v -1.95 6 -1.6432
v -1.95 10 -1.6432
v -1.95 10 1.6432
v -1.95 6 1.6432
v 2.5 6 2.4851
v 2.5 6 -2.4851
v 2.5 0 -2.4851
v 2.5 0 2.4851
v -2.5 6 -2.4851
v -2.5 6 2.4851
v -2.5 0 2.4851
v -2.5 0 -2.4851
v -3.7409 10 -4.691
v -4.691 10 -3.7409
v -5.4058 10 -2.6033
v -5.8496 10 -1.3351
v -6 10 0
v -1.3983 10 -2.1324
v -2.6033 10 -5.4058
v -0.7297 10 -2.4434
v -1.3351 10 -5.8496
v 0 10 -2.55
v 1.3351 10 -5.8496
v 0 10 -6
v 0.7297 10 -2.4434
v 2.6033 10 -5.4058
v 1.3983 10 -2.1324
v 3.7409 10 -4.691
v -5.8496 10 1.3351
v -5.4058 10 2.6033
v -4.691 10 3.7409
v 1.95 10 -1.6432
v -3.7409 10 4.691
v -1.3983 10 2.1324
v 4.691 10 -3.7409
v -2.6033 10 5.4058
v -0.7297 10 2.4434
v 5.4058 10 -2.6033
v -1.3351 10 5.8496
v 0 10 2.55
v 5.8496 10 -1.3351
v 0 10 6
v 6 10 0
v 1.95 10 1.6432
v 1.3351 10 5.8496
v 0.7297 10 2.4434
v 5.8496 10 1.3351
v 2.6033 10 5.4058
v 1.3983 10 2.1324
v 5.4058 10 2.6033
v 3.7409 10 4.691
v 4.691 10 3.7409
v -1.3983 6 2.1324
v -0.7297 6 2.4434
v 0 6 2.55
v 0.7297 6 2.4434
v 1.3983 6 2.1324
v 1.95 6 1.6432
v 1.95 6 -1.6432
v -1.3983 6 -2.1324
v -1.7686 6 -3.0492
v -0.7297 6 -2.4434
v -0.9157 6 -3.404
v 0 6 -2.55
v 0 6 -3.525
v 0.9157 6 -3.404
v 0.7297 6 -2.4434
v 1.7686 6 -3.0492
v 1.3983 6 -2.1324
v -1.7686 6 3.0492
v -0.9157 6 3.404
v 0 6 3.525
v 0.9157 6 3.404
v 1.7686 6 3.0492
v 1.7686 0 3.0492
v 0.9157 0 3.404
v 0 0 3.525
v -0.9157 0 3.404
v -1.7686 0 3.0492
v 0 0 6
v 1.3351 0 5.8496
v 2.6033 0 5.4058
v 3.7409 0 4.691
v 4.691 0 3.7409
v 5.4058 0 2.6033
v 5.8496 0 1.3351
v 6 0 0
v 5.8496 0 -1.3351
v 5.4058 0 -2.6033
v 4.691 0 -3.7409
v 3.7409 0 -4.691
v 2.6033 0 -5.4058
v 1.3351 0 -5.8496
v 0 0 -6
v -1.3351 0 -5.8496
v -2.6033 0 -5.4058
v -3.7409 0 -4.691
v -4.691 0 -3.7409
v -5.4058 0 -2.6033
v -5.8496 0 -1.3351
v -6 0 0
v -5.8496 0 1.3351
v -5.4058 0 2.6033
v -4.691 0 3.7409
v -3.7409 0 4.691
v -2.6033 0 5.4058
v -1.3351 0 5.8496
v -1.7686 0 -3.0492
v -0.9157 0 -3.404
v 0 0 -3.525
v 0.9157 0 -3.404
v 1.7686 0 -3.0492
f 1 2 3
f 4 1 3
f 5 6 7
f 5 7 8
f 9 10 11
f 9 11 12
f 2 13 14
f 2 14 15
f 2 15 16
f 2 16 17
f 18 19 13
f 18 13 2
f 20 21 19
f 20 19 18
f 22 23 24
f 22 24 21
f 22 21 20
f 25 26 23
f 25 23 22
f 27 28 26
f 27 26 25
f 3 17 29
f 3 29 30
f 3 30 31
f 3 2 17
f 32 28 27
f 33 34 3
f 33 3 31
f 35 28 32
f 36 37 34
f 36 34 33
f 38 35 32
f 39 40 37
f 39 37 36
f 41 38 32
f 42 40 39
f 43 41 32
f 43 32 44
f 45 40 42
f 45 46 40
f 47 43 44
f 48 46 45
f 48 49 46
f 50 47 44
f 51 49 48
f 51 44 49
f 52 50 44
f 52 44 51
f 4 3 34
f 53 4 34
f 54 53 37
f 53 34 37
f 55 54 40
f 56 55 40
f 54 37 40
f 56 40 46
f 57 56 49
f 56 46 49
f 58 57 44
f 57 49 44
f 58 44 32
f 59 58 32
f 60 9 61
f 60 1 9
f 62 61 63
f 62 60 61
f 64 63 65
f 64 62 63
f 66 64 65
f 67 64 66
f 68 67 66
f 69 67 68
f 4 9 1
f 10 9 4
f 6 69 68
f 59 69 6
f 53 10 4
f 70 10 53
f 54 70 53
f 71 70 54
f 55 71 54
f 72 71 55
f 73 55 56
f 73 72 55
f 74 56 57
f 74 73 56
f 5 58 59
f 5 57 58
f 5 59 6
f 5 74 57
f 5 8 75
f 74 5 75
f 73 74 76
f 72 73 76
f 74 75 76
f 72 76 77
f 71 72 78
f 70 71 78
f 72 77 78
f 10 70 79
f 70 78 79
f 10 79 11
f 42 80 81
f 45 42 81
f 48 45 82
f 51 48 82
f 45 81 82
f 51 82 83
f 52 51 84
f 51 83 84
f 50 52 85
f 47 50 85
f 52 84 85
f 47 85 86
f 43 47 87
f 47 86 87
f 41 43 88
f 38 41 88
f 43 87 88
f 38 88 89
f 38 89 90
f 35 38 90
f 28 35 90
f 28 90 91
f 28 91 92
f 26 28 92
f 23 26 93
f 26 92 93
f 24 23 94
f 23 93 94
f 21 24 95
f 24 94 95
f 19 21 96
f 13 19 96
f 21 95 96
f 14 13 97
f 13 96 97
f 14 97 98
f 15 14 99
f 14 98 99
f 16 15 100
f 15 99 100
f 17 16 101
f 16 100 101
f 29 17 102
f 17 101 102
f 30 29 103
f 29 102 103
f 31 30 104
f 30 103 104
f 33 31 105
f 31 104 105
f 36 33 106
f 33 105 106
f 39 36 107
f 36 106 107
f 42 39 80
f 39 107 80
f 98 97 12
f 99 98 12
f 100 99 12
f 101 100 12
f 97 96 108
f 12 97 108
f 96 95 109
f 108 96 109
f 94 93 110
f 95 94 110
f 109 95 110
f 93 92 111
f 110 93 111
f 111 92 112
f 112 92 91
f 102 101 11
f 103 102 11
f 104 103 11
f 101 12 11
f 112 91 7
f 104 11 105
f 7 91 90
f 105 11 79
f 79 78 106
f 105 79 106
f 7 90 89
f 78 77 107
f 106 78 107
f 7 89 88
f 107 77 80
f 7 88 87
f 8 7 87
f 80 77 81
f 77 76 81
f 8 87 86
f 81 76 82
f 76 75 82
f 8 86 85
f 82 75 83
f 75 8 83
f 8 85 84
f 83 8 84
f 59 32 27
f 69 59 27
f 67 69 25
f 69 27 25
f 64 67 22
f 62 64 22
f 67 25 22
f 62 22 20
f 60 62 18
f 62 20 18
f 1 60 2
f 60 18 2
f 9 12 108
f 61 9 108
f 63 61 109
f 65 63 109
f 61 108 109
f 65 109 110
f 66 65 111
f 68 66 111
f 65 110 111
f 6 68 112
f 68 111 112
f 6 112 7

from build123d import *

# Parameters (mm, degrees)
SKETCH1_R           = 6
BOSS_EXTRUDE1_DEPTH = 10
CUT_EXTRUDE1_DEPTH  = 6
CUT_EXTRUDE2_DEPTH  = 5


with BuildPart() as part:
    # Sketch1 → Boss-Extrude1 (new body)
    with BuildSketch(Plane(origin=(0, 0, 0), x_dir=(1, 0, 0), z_dir=(0, 1, 0))):
        with Locations(Location((0, 0, 0), (0, 0, 270))):
            Circle(SKETCH1_R)
    extrude(amount=BOSS_EXTRUDE1_DEPTH)

    # Sketch3 → Cut-Extrude1 (cut)
    with BuildSketch(Plane.XZ):
        with BuildLine():
            Line((2.5, -2.485080482), (2.5, 2.485080482))
            ThreePointArc((2.5, 2.485080482), (0, 3.525), (-2.5, 2.485080482))
            Line((-2.5, 2.485080482), (-2.5, -2.485080482))
            ThreePointArc((-2.5, -2.485080482), (0, -3.525), (2.5, -2.485080482))
        make_face()
    extrude(amount=-CUT_EXTRUDE1_DEPTH, mode=Mode.SUBTRACT)

    # Sketch2 → Cut-Extrude2 (cut)
    with BuildSketch(Plane(origin=(0, 10, 0), x_dir=(1, 0, 0), z_dir=(0, 1, 0))):
        with BuildLine():
            Line((1.95, -1.643167673), (1.95, 1.643167673))
            ThreePointArc((1.95, 1.643167673), (0, 2.55), (-1.95, 1.643167673))
            Line((-1.95, 1.643167673), (-1.95, -1.643167673))
            ThreePointArc((-1.95, -1.643167673), (0, -2.55), (1.95, -1.643167673))
        make_face()
    extrude(amount=-CUT_EXTRUDE2_DEPTH, mode=Mode.SUBTRACT)


solid = part.part
